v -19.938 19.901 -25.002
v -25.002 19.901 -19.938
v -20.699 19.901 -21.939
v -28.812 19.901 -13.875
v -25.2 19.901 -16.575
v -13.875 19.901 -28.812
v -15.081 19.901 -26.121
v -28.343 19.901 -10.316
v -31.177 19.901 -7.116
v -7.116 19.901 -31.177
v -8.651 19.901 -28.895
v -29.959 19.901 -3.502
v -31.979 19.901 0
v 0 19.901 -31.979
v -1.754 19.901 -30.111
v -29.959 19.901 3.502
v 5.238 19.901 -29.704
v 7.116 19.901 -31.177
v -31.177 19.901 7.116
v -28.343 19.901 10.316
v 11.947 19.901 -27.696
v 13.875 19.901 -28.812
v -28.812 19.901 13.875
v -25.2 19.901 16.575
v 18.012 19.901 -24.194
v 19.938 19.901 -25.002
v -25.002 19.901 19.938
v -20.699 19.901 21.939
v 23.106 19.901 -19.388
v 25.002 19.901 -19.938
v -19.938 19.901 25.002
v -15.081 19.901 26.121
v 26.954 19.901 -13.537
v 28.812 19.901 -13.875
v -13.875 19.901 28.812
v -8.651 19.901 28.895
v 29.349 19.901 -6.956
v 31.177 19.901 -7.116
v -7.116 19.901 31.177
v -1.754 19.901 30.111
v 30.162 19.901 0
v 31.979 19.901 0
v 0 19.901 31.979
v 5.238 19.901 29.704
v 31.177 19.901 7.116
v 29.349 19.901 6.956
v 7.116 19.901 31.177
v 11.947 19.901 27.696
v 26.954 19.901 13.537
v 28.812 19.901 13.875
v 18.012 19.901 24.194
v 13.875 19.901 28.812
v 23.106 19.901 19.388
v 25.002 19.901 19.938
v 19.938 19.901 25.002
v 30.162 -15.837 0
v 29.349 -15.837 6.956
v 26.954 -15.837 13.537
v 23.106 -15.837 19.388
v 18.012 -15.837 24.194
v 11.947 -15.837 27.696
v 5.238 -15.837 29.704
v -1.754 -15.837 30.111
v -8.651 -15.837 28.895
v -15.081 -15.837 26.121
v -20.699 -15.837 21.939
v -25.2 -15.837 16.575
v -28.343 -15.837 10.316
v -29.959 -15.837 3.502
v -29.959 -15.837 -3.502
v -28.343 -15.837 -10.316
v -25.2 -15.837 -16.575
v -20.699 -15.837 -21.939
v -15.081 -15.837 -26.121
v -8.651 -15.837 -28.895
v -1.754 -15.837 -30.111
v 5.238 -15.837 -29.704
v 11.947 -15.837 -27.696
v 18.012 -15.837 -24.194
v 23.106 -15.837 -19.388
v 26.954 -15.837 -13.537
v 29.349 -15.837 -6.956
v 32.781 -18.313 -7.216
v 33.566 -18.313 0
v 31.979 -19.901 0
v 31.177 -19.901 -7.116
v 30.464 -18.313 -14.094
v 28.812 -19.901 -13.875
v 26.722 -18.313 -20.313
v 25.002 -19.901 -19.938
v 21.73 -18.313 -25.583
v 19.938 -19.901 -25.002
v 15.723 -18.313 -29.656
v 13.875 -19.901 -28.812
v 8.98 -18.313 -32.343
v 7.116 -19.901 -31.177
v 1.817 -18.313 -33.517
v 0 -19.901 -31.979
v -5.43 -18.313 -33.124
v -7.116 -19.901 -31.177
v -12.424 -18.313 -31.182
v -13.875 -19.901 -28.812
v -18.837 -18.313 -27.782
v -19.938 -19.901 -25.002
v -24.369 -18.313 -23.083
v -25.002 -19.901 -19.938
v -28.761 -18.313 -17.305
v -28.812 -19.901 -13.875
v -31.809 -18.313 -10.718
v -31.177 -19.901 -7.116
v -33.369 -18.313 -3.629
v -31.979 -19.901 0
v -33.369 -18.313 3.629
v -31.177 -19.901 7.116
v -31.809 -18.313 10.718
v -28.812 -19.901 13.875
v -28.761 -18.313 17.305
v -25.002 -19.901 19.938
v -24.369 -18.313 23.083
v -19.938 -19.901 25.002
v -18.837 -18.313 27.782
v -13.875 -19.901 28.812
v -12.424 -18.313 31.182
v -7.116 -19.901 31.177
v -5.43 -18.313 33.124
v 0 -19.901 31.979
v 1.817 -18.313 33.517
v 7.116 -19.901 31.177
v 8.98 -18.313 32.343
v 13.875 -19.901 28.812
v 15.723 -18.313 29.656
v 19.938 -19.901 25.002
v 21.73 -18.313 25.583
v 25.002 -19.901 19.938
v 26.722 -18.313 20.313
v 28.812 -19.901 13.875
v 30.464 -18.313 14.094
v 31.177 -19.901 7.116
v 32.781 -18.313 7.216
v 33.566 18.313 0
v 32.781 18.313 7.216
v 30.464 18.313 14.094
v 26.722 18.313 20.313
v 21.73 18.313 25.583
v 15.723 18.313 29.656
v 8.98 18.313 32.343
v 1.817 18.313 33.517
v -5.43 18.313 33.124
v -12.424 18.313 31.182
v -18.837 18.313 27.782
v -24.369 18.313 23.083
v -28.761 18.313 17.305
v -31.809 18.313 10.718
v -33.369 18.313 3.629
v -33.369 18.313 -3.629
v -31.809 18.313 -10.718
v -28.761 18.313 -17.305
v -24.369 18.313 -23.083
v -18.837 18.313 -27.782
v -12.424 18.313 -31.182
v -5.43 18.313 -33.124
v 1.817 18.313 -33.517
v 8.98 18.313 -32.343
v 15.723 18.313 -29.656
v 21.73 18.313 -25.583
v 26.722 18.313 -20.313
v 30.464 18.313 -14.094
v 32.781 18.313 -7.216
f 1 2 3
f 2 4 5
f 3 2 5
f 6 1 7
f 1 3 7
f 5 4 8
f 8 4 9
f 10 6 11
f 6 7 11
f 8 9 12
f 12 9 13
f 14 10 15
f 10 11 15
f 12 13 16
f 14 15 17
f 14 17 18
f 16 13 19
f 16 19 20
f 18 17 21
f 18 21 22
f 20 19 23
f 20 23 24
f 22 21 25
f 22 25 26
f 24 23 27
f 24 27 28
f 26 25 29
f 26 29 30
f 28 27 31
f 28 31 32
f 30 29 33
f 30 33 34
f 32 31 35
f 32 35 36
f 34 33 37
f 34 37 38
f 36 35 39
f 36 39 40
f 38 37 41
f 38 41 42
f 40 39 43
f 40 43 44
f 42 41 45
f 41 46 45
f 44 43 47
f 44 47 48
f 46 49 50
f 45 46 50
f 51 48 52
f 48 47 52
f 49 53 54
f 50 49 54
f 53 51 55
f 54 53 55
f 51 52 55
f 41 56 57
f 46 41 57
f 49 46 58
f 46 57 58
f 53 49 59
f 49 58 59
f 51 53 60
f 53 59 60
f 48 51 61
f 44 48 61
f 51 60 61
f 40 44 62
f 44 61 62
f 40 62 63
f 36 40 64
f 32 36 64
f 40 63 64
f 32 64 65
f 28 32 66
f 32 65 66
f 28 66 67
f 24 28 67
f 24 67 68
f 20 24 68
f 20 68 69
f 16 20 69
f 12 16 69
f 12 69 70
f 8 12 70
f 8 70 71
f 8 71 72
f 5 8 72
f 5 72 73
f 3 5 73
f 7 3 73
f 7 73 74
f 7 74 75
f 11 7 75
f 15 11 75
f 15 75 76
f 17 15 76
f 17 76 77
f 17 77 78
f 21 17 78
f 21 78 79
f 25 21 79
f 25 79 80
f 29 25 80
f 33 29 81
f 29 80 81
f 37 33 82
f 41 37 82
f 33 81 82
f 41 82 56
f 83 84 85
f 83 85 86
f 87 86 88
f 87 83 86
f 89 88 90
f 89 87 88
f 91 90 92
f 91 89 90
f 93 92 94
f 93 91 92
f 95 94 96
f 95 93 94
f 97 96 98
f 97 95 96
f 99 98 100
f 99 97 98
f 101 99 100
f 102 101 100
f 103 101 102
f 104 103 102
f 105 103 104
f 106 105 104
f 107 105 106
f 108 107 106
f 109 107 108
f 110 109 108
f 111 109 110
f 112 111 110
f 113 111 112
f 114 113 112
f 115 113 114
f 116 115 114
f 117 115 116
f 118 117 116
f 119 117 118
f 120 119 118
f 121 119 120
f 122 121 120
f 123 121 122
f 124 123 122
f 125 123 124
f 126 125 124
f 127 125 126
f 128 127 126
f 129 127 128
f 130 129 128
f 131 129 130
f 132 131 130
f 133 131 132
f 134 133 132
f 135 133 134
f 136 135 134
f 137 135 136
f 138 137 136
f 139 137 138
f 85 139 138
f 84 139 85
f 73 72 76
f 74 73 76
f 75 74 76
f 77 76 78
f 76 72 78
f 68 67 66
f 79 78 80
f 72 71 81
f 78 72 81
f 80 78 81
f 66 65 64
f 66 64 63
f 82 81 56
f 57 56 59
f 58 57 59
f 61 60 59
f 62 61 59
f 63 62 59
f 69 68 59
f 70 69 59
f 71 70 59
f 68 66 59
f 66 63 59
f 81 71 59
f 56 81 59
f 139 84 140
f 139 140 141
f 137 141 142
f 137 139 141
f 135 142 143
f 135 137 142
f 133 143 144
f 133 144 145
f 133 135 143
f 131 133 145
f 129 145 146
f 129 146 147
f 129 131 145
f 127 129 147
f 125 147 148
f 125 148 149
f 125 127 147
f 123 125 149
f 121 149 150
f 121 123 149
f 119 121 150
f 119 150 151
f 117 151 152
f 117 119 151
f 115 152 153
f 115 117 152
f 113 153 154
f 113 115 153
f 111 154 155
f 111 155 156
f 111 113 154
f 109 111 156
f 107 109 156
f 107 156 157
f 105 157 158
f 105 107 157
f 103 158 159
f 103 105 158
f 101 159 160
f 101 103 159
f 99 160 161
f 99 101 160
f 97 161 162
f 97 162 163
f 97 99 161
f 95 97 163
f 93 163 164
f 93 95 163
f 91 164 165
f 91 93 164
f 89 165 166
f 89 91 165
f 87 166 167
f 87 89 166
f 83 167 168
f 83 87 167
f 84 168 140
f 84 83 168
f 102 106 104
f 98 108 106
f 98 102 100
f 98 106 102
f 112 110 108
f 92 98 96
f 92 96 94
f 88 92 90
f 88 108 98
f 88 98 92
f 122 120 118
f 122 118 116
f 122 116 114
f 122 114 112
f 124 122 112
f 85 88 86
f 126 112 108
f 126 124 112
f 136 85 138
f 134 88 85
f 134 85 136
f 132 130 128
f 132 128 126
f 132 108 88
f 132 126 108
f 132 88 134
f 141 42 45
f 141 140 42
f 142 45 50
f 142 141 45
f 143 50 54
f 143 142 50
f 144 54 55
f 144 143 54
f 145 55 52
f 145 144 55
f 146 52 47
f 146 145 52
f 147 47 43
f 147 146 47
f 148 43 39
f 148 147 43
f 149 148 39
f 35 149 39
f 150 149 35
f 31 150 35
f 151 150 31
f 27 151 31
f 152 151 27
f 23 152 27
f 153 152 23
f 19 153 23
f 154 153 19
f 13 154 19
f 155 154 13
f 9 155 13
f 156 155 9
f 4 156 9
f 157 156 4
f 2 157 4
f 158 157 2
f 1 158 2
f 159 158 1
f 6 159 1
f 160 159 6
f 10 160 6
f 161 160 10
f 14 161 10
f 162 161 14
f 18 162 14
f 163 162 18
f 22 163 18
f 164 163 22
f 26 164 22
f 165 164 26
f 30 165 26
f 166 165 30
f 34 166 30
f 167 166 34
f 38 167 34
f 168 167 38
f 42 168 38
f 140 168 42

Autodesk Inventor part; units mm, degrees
ref_plane "YZ Plane" through (0, 0, 0) normal (1, 0, 0) x (0, 1, 0)
ref_plane "XZ Plane" through (0, 0, 0) normal (0, 1, 0) x (-1, 0, 0)
ref_plane "XY Plane" through (0, 0, 0) normal (0, 0, 1) x (1, 0, 0)
sketch "Sketch1" plane through (0, 0, 0) normal (0, 0, 1) x (1, 0, 0)
  line L0 (0, 19.9009) -> (0, -19.9009)
  line L1 (33.5661, 19.9009) -> (33.5661, -19.9009)
  line L2 (33.5661, -19.9009) -> (0, -19.9009)
  line L3 (33.5661, 19.9009) -> (30.1625, 19.9009)
  line L4 (30.1625, 19.9009) -> (30.1625, -15.8369)
  line L5 (30.1625, -15.8369) -> (0, -15.8369)
  point P0 (0, 0)
  dimension "d0" = 39.8018
  dimension "d1" = 19.9009
  dimension "d2" = 39.8018
  dimension "d3" = 19.9009
  dimension "d4" = 67.1322
  dimension "d5" = 60.325
  dimension "d7" = 35.7378
revolve "Revolution1" add sketch "Sketch1" angle 360 about axis through (0, 19.9009, 0) along (0, -1, 0)
chamfer "Chamfer1" distance 1.5875 angle 45 2 edges at (-33.5661, 19.9009, 0) (-33.5661, -19.9009, 0)
equation "\"d0\" = d2"
equation "\"d1\" = 0.5 * d0"
equation "\"d3\" = 0.5 * d2"
properties part number "Flat Cap External 2 IN" material "PVC-Piping"
